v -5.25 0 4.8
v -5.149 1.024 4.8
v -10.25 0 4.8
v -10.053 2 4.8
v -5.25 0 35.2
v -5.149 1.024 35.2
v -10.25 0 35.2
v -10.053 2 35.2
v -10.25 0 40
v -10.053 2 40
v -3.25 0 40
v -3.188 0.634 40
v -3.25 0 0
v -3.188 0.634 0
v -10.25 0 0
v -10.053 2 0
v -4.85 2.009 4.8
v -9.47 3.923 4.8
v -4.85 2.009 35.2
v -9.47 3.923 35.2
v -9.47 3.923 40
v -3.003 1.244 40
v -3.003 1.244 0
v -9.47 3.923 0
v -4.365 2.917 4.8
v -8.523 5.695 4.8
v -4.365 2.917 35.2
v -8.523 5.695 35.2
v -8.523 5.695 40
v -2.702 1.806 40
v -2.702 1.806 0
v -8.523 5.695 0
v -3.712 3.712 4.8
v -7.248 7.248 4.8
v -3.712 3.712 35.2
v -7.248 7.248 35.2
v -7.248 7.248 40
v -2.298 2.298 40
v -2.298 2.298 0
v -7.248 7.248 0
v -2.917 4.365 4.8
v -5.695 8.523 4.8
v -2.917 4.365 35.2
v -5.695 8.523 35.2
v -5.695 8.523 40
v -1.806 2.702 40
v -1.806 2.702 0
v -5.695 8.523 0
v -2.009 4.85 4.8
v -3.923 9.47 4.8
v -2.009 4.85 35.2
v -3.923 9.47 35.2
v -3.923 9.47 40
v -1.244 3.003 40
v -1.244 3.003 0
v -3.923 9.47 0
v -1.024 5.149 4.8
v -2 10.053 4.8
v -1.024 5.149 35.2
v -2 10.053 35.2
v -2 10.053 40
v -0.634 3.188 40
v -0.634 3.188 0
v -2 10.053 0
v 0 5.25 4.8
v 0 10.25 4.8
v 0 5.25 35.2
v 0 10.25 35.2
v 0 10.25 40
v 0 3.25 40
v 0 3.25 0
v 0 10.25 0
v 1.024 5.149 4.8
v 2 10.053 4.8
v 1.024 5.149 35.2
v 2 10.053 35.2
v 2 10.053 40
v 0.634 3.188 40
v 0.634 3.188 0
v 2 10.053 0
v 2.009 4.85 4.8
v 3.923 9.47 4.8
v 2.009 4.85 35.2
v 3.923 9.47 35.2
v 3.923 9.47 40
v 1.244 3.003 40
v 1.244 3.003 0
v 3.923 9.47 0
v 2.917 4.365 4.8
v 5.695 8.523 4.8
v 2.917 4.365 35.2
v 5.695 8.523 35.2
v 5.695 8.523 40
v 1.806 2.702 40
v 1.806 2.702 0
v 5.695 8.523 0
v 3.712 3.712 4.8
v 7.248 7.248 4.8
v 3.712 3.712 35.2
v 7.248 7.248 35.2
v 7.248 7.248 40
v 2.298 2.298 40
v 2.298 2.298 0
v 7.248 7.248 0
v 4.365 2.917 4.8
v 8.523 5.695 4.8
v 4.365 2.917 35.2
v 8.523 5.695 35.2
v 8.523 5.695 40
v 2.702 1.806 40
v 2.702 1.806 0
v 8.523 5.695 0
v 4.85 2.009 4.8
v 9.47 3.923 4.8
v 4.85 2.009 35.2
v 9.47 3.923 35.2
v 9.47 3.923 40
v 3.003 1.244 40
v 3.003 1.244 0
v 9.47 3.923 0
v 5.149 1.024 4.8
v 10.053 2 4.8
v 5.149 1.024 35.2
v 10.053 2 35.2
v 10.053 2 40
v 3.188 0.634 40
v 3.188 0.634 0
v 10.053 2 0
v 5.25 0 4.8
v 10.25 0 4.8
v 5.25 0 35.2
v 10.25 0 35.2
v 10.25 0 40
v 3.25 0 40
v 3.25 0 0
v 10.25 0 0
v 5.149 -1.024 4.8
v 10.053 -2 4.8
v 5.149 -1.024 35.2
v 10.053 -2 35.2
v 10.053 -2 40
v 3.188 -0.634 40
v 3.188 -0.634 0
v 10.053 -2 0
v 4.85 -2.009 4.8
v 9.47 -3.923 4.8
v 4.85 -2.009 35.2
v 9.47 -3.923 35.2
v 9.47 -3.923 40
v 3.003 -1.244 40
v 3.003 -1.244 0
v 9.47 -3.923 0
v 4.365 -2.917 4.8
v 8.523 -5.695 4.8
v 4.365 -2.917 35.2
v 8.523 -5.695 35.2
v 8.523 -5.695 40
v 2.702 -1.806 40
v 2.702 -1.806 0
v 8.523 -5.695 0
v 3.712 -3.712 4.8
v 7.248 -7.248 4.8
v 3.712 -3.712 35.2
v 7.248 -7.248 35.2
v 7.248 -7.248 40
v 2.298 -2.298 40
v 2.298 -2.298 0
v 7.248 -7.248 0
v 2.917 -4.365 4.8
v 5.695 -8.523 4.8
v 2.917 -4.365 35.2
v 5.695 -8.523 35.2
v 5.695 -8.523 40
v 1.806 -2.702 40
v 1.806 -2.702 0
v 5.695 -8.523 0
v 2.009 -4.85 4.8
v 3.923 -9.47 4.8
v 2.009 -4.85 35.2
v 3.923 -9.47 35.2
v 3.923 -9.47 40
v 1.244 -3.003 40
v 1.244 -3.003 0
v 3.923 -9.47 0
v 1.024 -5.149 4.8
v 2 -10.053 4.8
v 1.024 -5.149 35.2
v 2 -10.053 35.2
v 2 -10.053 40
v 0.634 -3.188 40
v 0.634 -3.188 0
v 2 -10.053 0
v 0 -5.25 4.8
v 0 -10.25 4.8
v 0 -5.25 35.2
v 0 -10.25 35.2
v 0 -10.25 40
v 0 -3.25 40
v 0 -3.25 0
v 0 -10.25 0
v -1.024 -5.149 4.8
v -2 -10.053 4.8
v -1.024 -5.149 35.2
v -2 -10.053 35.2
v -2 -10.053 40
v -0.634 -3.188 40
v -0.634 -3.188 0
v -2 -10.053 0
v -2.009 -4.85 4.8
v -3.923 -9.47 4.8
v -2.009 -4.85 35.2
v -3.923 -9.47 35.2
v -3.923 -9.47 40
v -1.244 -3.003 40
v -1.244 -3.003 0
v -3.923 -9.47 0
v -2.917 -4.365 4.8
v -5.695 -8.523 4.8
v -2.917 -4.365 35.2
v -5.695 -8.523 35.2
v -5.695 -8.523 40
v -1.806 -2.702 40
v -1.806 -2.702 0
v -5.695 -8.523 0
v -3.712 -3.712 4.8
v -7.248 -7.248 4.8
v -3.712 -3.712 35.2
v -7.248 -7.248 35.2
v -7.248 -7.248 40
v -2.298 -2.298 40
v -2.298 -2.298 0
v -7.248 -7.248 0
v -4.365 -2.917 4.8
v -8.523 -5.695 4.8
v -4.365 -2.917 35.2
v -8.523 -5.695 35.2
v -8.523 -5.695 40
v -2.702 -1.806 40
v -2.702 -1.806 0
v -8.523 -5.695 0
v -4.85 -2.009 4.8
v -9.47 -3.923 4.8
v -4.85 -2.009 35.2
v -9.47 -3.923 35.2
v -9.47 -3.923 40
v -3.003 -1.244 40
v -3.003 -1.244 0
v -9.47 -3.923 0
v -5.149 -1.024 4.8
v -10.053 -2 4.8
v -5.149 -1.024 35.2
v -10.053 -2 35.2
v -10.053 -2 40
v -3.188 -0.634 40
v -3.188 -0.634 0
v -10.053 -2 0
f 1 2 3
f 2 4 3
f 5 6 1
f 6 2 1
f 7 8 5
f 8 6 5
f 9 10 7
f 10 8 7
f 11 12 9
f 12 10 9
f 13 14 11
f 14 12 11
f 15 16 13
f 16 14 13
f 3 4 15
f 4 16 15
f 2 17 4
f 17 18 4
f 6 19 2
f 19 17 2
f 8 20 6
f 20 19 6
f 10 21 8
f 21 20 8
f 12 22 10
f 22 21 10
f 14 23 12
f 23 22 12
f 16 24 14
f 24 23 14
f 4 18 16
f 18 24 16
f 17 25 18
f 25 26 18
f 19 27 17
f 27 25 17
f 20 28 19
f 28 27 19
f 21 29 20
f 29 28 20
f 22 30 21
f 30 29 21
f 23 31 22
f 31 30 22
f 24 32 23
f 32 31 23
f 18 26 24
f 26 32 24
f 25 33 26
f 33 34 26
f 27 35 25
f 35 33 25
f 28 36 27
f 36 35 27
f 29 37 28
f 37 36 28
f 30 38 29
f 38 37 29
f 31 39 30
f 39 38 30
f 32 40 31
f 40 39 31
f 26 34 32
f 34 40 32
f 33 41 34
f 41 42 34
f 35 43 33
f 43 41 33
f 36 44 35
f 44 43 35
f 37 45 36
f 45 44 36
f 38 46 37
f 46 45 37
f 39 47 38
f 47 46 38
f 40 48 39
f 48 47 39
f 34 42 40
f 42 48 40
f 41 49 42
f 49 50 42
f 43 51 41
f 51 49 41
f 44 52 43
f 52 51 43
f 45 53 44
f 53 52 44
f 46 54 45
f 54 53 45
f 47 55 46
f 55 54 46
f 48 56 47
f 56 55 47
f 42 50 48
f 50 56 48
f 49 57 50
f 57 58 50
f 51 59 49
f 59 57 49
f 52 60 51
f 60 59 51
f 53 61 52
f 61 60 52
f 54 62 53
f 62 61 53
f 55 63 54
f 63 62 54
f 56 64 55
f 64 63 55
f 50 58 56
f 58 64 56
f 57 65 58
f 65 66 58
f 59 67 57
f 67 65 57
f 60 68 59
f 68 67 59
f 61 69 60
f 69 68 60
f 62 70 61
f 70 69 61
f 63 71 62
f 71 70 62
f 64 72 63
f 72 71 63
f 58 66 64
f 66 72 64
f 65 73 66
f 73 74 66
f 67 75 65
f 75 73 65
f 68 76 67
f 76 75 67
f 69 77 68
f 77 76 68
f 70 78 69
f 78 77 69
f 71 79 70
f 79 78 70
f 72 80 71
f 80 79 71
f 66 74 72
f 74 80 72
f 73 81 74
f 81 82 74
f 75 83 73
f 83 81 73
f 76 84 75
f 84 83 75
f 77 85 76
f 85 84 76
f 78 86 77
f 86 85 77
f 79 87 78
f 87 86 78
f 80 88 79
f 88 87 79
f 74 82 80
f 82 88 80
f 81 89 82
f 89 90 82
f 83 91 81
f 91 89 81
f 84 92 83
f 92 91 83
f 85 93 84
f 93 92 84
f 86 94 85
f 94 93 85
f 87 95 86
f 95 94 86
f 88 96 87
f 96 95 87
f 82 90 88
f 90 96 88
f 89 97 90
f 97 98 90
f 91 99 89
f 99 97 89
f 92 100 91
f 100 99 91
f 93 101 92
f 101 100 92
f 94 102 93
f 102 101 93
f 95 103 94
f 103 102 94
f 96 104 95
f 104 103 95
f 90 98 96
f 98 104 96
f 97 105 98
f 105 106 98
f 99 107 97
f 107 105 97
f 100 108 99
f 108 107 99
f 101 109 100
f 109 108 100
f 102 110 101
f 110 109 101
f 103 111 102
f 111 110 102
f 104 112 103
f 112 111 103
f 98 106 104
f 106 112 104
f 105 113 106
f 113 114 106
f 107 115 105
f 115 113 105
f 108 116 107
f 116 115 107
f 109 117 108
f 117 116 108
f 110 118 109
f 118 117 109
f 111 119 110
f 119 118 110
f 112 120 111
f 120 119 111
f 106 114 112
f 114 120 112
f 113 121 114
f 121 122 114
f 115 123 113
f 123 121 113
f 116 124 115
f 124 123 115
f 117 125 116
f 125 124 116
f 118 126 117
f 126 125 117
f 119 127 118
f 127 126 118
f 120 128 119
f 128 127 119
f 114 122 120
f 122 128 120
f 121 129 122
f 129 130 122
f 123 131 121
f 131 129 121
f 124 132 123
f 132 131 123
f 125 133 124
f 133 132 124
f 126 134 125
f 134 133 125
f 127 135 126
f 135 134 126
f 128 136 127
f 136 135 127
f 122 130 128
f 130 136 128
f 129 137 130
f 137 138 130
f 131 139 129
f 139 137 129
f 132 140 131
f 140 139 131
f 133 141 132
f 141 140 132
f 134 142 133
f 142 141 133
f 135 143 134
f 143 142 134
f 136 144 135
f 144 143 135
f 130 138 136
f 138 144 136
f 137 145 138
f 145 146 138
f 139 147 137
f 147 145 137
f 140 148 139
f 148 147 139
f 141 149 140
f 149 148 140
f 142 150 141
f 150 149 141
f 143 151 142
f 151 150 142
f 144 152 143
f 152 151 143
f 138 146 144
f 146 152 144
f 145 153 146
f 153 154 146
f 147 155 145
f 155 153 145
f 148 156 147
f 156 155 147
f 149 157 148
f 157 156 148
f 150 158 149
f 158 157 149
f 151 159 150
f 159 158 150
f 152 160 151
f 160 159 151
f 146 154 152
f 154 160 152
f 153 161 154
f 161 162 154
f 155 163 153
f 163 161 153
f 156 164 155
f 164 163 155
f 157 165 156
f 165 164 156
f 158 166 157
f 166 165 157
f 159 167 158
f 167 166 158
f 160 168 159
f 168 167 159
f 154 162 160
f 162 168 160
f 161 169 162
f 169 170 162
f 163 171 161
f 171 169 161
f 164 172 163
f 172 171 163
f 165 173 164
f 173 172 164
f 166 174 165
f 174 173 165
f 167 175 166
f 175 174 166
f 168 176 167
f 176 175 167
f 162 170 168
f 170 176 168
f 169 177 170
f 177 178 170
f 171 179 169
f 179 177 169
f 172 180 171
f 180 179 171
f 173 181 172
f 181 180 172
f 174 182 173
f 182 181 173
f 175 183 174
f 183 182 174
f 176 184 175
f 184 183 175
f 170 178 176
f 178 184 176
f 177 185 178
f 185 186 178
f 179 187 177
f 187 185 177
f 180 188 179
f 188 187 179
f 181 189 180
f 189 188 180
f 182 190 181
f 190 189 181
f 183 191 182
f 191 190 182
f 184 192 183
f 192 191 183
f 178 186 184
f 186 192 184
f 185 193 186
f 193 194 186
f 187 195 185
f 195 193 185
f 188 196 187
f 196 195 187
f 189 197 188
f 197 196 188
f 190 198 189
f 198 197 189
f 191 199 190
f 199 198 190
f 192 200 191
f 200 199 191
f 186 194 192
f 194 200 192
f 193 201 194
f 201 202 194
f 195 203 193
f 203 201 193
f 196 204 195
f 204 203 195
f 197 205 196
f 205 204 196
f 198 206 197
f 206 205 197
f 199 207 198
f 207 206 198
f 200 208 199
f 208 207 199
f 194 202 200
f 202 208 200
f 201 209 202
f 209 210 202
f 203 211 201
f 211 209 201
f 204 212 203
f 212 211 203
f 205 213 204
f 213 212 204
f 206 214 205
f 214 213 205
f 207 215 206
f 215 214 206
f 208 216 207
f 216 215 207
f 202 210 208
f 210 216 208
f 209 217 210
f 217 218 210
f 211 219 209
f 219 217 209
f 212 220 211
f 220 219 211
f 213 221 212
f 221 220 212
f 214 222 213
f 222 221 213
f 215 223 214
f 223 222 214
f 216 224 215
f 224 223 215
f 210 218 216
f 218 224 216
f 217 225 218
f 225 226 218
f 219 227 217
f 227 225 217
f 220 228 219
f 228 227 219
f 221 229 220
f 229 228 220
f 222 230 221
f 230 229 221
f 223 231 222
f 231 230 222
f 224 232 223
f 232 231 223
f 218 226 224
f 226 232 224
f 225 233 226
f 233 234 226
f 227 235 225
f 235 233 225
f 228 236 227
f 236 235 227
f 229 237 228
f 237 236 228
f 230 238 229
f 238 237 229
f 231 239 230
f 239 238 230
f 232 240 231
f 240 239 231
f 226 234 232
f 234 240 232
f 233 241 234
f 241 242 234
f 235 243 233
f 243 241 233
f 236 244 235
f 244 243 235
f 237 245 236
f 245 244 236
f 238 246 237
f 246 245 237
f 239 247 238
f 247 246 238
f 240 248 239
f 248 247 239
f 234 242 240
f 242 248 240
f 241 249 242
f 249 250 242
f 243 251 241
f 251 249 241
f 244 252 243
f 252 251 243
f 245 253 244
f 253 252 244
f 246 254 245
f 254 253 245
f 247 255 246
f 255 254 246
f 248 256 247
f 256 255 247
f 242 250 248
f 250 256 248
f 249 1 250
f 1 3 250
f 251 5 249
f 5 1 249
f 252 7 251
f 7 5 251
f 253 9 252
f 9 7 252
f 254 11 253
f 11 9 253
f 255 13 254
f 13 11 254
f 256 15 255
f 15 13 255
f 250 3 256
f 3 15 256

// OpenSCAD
$fn = 32;

// ----------------------------------------------------------------------
// Profiled standoff: spool spacer, 40 mm long, bore 6.5 mm
// ----------------------------------------------------------------------

// --- parameters (mm) ---
revolve_angle = 360;      // full turn around the Z axis
profile_points = 8;       // points of the closed outline

profile = [[3.25, 0], [10.25, 0], [10.25, 4.8], [5.25, 4.8], [5.25, 35.2], [10.25, 35.2], [10.25, 40], [3.25, 40]];  // single closed polygon, 8 points, counter clockwise

// --- the one profile operation ---
rotate_extrude(angle = revolve_angle) polygon(points = profile);
